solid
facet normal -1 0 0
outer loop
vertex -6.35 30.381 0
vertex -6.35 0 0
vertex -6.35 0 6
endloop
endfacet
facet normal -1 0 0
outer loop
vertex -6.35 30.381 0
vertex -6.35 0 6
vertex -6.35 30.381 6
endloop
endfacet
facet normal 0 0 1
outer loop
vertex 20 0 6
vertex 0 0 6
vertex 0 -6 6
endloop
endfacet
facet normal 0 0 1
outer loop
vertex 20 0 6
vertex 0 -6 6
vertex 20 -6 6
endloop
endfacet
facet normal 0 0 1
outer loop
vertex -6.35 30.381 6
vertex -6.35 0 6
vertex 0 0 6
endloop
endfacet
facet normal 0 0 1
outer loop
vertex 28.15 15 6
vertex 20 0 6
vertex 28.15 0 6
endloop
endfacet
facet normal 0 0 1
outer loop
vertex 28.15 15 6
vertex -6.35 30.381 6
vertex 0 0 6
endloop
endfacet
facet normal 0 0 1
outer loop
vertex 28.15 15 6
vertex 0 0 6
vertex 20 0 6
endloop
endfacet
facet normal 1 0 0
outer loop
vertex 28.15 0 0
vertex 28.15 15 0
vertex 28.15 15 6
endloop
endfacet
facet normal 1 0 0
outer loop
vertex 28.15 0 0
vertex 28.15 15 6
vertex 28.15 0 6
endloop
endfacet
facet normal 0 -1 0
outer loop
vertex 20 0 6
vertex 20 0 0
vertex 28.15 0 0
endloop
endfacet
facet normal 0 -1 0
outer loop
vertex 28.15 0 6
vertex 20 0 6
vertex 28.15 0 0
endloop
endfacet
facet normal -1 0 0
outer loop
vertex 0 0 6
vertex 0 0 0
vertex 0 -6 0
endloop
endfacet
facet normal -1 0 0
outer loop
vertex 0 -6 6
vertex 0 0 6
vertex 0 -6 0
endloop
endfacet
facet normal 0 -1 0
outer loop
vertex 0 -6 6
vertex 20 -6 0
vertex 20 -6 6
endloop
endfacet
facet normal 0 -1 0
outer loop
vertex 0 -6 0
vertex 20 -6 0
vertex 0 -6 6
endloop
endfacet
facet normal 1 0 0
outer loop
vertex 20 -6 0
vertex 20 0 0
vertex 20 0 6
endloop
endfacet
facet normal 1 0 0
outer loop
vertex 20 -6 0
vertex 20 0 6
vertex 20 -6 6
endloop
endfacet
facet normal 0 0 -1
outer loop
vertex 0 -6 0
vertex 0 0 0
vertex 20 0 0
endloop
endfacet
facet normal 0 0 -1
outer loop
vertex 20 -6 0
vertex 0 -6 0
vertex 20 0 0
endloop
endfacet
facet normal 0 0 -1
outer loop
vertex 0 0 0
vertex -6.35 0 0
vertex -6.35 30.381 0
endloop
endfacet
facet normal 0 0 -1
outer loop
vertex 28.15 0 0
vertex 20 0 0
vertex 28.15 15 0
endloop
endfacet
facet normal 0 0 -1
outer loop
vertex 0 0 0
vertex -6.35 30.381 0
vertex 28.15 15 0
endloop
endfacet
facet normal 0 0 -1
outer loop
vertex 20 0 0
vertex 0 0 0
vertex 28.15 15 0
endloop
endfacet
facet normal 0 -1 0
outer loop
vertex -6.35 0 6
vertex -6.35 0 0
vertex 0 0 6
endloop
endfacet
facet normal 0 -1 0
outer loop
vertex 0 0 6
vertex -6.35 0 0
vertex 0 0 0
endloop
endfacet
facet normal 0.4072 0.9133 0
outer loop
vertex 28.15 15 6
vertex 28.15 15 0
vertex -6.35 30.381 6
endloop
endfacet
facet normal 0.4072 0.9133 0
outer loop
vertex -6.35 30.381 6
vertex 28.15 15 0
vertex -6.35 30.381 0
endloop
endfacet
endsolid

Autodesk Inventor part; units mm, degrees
ref_plane "YZ Plane" through (0, 0, 0) normal (1, 0, 0) x (0, 1, 0)
ref_plane "XZ Plane" through (0, 0, 0) normal (0, 1, 0) x (-1, 0, 0)
ref_plane "XY Plane" through (0, 0, 0) normal (0, 0, 1) x (1, 0, 0)
ref_plane "Work Plane1" through (0, 0, 0) normal (0, 0, 1) x (1, 0, 0)
sketch "Sketch1" plane through (0, 0, 0) normal (0, 0, 1) x (1, 0, 0)
  line L0 (0, 0) -> (20, 0)
  line L1 (0, 0) -> (0, -6)
  line L2 (20, -6) -> (0, -6)
  line L3 (20, 0) -> (20, -6)
  line L4 (34.15, 0) -> (34.15, 6.2)
  line L5 (34.15, 0) -> (28.15, 0)
  line L6 (28.15, 6.2) -> (28.15, 0)
  line L7 (34.15, 6.2) -> (28.15, 6.2)
  line L8 (28.15, 15) -> (28.15, 0)
  line L9 (-7.85, 48.6) -> (-7.85, 2.8)
  line L10 (-7.85, 0) -> (28.15, 0)
  line L11 (28.15, 0) -> (28.15, 15)
  line L12 (28.15, 15) -> (-7.85, 15)
  line L13 (-7.85, 15) -> (-7.85, 0)
  line L14 (28.15, 15) -> (-7.85, 31.05)
  line L15 (-7.85, 31.05) -> (-7.85, 15)
  line L16 (-6.35, 0) -> (-6.35, 30.3813)
  point P0 (-8.95, 31.05)
  dimension "d1" = 1.5
extrude "Plate2" add sketch "Sketch1" along normal blind 6 contours L10 L16 L12 L8 L6 L0 | L0 L3 L2 L1 | L16 L14 L12
equation "\"d2\" = Thickness"
equation "\"BendRadius\" = Thickness"
equation "\"BendReliefWidth\" = Thickness"
equation "\"BendReliefDepth\" = 0.5 * Thickness"
equation "\"CornerReliefSize\" = 4 * Thickness"
equation "\"MinimumRemnant\" = 2 * Thickness"
equation "\"TransitionRadius\" = BendRadius"
equation "\"JacobiRadiusSize\" = BendRadius"
equation "\"GapSize\" = Thickness"
equation "\"Thickness\" = 6"
properties part number "tussenschotje" material "Wood (Birch)"
